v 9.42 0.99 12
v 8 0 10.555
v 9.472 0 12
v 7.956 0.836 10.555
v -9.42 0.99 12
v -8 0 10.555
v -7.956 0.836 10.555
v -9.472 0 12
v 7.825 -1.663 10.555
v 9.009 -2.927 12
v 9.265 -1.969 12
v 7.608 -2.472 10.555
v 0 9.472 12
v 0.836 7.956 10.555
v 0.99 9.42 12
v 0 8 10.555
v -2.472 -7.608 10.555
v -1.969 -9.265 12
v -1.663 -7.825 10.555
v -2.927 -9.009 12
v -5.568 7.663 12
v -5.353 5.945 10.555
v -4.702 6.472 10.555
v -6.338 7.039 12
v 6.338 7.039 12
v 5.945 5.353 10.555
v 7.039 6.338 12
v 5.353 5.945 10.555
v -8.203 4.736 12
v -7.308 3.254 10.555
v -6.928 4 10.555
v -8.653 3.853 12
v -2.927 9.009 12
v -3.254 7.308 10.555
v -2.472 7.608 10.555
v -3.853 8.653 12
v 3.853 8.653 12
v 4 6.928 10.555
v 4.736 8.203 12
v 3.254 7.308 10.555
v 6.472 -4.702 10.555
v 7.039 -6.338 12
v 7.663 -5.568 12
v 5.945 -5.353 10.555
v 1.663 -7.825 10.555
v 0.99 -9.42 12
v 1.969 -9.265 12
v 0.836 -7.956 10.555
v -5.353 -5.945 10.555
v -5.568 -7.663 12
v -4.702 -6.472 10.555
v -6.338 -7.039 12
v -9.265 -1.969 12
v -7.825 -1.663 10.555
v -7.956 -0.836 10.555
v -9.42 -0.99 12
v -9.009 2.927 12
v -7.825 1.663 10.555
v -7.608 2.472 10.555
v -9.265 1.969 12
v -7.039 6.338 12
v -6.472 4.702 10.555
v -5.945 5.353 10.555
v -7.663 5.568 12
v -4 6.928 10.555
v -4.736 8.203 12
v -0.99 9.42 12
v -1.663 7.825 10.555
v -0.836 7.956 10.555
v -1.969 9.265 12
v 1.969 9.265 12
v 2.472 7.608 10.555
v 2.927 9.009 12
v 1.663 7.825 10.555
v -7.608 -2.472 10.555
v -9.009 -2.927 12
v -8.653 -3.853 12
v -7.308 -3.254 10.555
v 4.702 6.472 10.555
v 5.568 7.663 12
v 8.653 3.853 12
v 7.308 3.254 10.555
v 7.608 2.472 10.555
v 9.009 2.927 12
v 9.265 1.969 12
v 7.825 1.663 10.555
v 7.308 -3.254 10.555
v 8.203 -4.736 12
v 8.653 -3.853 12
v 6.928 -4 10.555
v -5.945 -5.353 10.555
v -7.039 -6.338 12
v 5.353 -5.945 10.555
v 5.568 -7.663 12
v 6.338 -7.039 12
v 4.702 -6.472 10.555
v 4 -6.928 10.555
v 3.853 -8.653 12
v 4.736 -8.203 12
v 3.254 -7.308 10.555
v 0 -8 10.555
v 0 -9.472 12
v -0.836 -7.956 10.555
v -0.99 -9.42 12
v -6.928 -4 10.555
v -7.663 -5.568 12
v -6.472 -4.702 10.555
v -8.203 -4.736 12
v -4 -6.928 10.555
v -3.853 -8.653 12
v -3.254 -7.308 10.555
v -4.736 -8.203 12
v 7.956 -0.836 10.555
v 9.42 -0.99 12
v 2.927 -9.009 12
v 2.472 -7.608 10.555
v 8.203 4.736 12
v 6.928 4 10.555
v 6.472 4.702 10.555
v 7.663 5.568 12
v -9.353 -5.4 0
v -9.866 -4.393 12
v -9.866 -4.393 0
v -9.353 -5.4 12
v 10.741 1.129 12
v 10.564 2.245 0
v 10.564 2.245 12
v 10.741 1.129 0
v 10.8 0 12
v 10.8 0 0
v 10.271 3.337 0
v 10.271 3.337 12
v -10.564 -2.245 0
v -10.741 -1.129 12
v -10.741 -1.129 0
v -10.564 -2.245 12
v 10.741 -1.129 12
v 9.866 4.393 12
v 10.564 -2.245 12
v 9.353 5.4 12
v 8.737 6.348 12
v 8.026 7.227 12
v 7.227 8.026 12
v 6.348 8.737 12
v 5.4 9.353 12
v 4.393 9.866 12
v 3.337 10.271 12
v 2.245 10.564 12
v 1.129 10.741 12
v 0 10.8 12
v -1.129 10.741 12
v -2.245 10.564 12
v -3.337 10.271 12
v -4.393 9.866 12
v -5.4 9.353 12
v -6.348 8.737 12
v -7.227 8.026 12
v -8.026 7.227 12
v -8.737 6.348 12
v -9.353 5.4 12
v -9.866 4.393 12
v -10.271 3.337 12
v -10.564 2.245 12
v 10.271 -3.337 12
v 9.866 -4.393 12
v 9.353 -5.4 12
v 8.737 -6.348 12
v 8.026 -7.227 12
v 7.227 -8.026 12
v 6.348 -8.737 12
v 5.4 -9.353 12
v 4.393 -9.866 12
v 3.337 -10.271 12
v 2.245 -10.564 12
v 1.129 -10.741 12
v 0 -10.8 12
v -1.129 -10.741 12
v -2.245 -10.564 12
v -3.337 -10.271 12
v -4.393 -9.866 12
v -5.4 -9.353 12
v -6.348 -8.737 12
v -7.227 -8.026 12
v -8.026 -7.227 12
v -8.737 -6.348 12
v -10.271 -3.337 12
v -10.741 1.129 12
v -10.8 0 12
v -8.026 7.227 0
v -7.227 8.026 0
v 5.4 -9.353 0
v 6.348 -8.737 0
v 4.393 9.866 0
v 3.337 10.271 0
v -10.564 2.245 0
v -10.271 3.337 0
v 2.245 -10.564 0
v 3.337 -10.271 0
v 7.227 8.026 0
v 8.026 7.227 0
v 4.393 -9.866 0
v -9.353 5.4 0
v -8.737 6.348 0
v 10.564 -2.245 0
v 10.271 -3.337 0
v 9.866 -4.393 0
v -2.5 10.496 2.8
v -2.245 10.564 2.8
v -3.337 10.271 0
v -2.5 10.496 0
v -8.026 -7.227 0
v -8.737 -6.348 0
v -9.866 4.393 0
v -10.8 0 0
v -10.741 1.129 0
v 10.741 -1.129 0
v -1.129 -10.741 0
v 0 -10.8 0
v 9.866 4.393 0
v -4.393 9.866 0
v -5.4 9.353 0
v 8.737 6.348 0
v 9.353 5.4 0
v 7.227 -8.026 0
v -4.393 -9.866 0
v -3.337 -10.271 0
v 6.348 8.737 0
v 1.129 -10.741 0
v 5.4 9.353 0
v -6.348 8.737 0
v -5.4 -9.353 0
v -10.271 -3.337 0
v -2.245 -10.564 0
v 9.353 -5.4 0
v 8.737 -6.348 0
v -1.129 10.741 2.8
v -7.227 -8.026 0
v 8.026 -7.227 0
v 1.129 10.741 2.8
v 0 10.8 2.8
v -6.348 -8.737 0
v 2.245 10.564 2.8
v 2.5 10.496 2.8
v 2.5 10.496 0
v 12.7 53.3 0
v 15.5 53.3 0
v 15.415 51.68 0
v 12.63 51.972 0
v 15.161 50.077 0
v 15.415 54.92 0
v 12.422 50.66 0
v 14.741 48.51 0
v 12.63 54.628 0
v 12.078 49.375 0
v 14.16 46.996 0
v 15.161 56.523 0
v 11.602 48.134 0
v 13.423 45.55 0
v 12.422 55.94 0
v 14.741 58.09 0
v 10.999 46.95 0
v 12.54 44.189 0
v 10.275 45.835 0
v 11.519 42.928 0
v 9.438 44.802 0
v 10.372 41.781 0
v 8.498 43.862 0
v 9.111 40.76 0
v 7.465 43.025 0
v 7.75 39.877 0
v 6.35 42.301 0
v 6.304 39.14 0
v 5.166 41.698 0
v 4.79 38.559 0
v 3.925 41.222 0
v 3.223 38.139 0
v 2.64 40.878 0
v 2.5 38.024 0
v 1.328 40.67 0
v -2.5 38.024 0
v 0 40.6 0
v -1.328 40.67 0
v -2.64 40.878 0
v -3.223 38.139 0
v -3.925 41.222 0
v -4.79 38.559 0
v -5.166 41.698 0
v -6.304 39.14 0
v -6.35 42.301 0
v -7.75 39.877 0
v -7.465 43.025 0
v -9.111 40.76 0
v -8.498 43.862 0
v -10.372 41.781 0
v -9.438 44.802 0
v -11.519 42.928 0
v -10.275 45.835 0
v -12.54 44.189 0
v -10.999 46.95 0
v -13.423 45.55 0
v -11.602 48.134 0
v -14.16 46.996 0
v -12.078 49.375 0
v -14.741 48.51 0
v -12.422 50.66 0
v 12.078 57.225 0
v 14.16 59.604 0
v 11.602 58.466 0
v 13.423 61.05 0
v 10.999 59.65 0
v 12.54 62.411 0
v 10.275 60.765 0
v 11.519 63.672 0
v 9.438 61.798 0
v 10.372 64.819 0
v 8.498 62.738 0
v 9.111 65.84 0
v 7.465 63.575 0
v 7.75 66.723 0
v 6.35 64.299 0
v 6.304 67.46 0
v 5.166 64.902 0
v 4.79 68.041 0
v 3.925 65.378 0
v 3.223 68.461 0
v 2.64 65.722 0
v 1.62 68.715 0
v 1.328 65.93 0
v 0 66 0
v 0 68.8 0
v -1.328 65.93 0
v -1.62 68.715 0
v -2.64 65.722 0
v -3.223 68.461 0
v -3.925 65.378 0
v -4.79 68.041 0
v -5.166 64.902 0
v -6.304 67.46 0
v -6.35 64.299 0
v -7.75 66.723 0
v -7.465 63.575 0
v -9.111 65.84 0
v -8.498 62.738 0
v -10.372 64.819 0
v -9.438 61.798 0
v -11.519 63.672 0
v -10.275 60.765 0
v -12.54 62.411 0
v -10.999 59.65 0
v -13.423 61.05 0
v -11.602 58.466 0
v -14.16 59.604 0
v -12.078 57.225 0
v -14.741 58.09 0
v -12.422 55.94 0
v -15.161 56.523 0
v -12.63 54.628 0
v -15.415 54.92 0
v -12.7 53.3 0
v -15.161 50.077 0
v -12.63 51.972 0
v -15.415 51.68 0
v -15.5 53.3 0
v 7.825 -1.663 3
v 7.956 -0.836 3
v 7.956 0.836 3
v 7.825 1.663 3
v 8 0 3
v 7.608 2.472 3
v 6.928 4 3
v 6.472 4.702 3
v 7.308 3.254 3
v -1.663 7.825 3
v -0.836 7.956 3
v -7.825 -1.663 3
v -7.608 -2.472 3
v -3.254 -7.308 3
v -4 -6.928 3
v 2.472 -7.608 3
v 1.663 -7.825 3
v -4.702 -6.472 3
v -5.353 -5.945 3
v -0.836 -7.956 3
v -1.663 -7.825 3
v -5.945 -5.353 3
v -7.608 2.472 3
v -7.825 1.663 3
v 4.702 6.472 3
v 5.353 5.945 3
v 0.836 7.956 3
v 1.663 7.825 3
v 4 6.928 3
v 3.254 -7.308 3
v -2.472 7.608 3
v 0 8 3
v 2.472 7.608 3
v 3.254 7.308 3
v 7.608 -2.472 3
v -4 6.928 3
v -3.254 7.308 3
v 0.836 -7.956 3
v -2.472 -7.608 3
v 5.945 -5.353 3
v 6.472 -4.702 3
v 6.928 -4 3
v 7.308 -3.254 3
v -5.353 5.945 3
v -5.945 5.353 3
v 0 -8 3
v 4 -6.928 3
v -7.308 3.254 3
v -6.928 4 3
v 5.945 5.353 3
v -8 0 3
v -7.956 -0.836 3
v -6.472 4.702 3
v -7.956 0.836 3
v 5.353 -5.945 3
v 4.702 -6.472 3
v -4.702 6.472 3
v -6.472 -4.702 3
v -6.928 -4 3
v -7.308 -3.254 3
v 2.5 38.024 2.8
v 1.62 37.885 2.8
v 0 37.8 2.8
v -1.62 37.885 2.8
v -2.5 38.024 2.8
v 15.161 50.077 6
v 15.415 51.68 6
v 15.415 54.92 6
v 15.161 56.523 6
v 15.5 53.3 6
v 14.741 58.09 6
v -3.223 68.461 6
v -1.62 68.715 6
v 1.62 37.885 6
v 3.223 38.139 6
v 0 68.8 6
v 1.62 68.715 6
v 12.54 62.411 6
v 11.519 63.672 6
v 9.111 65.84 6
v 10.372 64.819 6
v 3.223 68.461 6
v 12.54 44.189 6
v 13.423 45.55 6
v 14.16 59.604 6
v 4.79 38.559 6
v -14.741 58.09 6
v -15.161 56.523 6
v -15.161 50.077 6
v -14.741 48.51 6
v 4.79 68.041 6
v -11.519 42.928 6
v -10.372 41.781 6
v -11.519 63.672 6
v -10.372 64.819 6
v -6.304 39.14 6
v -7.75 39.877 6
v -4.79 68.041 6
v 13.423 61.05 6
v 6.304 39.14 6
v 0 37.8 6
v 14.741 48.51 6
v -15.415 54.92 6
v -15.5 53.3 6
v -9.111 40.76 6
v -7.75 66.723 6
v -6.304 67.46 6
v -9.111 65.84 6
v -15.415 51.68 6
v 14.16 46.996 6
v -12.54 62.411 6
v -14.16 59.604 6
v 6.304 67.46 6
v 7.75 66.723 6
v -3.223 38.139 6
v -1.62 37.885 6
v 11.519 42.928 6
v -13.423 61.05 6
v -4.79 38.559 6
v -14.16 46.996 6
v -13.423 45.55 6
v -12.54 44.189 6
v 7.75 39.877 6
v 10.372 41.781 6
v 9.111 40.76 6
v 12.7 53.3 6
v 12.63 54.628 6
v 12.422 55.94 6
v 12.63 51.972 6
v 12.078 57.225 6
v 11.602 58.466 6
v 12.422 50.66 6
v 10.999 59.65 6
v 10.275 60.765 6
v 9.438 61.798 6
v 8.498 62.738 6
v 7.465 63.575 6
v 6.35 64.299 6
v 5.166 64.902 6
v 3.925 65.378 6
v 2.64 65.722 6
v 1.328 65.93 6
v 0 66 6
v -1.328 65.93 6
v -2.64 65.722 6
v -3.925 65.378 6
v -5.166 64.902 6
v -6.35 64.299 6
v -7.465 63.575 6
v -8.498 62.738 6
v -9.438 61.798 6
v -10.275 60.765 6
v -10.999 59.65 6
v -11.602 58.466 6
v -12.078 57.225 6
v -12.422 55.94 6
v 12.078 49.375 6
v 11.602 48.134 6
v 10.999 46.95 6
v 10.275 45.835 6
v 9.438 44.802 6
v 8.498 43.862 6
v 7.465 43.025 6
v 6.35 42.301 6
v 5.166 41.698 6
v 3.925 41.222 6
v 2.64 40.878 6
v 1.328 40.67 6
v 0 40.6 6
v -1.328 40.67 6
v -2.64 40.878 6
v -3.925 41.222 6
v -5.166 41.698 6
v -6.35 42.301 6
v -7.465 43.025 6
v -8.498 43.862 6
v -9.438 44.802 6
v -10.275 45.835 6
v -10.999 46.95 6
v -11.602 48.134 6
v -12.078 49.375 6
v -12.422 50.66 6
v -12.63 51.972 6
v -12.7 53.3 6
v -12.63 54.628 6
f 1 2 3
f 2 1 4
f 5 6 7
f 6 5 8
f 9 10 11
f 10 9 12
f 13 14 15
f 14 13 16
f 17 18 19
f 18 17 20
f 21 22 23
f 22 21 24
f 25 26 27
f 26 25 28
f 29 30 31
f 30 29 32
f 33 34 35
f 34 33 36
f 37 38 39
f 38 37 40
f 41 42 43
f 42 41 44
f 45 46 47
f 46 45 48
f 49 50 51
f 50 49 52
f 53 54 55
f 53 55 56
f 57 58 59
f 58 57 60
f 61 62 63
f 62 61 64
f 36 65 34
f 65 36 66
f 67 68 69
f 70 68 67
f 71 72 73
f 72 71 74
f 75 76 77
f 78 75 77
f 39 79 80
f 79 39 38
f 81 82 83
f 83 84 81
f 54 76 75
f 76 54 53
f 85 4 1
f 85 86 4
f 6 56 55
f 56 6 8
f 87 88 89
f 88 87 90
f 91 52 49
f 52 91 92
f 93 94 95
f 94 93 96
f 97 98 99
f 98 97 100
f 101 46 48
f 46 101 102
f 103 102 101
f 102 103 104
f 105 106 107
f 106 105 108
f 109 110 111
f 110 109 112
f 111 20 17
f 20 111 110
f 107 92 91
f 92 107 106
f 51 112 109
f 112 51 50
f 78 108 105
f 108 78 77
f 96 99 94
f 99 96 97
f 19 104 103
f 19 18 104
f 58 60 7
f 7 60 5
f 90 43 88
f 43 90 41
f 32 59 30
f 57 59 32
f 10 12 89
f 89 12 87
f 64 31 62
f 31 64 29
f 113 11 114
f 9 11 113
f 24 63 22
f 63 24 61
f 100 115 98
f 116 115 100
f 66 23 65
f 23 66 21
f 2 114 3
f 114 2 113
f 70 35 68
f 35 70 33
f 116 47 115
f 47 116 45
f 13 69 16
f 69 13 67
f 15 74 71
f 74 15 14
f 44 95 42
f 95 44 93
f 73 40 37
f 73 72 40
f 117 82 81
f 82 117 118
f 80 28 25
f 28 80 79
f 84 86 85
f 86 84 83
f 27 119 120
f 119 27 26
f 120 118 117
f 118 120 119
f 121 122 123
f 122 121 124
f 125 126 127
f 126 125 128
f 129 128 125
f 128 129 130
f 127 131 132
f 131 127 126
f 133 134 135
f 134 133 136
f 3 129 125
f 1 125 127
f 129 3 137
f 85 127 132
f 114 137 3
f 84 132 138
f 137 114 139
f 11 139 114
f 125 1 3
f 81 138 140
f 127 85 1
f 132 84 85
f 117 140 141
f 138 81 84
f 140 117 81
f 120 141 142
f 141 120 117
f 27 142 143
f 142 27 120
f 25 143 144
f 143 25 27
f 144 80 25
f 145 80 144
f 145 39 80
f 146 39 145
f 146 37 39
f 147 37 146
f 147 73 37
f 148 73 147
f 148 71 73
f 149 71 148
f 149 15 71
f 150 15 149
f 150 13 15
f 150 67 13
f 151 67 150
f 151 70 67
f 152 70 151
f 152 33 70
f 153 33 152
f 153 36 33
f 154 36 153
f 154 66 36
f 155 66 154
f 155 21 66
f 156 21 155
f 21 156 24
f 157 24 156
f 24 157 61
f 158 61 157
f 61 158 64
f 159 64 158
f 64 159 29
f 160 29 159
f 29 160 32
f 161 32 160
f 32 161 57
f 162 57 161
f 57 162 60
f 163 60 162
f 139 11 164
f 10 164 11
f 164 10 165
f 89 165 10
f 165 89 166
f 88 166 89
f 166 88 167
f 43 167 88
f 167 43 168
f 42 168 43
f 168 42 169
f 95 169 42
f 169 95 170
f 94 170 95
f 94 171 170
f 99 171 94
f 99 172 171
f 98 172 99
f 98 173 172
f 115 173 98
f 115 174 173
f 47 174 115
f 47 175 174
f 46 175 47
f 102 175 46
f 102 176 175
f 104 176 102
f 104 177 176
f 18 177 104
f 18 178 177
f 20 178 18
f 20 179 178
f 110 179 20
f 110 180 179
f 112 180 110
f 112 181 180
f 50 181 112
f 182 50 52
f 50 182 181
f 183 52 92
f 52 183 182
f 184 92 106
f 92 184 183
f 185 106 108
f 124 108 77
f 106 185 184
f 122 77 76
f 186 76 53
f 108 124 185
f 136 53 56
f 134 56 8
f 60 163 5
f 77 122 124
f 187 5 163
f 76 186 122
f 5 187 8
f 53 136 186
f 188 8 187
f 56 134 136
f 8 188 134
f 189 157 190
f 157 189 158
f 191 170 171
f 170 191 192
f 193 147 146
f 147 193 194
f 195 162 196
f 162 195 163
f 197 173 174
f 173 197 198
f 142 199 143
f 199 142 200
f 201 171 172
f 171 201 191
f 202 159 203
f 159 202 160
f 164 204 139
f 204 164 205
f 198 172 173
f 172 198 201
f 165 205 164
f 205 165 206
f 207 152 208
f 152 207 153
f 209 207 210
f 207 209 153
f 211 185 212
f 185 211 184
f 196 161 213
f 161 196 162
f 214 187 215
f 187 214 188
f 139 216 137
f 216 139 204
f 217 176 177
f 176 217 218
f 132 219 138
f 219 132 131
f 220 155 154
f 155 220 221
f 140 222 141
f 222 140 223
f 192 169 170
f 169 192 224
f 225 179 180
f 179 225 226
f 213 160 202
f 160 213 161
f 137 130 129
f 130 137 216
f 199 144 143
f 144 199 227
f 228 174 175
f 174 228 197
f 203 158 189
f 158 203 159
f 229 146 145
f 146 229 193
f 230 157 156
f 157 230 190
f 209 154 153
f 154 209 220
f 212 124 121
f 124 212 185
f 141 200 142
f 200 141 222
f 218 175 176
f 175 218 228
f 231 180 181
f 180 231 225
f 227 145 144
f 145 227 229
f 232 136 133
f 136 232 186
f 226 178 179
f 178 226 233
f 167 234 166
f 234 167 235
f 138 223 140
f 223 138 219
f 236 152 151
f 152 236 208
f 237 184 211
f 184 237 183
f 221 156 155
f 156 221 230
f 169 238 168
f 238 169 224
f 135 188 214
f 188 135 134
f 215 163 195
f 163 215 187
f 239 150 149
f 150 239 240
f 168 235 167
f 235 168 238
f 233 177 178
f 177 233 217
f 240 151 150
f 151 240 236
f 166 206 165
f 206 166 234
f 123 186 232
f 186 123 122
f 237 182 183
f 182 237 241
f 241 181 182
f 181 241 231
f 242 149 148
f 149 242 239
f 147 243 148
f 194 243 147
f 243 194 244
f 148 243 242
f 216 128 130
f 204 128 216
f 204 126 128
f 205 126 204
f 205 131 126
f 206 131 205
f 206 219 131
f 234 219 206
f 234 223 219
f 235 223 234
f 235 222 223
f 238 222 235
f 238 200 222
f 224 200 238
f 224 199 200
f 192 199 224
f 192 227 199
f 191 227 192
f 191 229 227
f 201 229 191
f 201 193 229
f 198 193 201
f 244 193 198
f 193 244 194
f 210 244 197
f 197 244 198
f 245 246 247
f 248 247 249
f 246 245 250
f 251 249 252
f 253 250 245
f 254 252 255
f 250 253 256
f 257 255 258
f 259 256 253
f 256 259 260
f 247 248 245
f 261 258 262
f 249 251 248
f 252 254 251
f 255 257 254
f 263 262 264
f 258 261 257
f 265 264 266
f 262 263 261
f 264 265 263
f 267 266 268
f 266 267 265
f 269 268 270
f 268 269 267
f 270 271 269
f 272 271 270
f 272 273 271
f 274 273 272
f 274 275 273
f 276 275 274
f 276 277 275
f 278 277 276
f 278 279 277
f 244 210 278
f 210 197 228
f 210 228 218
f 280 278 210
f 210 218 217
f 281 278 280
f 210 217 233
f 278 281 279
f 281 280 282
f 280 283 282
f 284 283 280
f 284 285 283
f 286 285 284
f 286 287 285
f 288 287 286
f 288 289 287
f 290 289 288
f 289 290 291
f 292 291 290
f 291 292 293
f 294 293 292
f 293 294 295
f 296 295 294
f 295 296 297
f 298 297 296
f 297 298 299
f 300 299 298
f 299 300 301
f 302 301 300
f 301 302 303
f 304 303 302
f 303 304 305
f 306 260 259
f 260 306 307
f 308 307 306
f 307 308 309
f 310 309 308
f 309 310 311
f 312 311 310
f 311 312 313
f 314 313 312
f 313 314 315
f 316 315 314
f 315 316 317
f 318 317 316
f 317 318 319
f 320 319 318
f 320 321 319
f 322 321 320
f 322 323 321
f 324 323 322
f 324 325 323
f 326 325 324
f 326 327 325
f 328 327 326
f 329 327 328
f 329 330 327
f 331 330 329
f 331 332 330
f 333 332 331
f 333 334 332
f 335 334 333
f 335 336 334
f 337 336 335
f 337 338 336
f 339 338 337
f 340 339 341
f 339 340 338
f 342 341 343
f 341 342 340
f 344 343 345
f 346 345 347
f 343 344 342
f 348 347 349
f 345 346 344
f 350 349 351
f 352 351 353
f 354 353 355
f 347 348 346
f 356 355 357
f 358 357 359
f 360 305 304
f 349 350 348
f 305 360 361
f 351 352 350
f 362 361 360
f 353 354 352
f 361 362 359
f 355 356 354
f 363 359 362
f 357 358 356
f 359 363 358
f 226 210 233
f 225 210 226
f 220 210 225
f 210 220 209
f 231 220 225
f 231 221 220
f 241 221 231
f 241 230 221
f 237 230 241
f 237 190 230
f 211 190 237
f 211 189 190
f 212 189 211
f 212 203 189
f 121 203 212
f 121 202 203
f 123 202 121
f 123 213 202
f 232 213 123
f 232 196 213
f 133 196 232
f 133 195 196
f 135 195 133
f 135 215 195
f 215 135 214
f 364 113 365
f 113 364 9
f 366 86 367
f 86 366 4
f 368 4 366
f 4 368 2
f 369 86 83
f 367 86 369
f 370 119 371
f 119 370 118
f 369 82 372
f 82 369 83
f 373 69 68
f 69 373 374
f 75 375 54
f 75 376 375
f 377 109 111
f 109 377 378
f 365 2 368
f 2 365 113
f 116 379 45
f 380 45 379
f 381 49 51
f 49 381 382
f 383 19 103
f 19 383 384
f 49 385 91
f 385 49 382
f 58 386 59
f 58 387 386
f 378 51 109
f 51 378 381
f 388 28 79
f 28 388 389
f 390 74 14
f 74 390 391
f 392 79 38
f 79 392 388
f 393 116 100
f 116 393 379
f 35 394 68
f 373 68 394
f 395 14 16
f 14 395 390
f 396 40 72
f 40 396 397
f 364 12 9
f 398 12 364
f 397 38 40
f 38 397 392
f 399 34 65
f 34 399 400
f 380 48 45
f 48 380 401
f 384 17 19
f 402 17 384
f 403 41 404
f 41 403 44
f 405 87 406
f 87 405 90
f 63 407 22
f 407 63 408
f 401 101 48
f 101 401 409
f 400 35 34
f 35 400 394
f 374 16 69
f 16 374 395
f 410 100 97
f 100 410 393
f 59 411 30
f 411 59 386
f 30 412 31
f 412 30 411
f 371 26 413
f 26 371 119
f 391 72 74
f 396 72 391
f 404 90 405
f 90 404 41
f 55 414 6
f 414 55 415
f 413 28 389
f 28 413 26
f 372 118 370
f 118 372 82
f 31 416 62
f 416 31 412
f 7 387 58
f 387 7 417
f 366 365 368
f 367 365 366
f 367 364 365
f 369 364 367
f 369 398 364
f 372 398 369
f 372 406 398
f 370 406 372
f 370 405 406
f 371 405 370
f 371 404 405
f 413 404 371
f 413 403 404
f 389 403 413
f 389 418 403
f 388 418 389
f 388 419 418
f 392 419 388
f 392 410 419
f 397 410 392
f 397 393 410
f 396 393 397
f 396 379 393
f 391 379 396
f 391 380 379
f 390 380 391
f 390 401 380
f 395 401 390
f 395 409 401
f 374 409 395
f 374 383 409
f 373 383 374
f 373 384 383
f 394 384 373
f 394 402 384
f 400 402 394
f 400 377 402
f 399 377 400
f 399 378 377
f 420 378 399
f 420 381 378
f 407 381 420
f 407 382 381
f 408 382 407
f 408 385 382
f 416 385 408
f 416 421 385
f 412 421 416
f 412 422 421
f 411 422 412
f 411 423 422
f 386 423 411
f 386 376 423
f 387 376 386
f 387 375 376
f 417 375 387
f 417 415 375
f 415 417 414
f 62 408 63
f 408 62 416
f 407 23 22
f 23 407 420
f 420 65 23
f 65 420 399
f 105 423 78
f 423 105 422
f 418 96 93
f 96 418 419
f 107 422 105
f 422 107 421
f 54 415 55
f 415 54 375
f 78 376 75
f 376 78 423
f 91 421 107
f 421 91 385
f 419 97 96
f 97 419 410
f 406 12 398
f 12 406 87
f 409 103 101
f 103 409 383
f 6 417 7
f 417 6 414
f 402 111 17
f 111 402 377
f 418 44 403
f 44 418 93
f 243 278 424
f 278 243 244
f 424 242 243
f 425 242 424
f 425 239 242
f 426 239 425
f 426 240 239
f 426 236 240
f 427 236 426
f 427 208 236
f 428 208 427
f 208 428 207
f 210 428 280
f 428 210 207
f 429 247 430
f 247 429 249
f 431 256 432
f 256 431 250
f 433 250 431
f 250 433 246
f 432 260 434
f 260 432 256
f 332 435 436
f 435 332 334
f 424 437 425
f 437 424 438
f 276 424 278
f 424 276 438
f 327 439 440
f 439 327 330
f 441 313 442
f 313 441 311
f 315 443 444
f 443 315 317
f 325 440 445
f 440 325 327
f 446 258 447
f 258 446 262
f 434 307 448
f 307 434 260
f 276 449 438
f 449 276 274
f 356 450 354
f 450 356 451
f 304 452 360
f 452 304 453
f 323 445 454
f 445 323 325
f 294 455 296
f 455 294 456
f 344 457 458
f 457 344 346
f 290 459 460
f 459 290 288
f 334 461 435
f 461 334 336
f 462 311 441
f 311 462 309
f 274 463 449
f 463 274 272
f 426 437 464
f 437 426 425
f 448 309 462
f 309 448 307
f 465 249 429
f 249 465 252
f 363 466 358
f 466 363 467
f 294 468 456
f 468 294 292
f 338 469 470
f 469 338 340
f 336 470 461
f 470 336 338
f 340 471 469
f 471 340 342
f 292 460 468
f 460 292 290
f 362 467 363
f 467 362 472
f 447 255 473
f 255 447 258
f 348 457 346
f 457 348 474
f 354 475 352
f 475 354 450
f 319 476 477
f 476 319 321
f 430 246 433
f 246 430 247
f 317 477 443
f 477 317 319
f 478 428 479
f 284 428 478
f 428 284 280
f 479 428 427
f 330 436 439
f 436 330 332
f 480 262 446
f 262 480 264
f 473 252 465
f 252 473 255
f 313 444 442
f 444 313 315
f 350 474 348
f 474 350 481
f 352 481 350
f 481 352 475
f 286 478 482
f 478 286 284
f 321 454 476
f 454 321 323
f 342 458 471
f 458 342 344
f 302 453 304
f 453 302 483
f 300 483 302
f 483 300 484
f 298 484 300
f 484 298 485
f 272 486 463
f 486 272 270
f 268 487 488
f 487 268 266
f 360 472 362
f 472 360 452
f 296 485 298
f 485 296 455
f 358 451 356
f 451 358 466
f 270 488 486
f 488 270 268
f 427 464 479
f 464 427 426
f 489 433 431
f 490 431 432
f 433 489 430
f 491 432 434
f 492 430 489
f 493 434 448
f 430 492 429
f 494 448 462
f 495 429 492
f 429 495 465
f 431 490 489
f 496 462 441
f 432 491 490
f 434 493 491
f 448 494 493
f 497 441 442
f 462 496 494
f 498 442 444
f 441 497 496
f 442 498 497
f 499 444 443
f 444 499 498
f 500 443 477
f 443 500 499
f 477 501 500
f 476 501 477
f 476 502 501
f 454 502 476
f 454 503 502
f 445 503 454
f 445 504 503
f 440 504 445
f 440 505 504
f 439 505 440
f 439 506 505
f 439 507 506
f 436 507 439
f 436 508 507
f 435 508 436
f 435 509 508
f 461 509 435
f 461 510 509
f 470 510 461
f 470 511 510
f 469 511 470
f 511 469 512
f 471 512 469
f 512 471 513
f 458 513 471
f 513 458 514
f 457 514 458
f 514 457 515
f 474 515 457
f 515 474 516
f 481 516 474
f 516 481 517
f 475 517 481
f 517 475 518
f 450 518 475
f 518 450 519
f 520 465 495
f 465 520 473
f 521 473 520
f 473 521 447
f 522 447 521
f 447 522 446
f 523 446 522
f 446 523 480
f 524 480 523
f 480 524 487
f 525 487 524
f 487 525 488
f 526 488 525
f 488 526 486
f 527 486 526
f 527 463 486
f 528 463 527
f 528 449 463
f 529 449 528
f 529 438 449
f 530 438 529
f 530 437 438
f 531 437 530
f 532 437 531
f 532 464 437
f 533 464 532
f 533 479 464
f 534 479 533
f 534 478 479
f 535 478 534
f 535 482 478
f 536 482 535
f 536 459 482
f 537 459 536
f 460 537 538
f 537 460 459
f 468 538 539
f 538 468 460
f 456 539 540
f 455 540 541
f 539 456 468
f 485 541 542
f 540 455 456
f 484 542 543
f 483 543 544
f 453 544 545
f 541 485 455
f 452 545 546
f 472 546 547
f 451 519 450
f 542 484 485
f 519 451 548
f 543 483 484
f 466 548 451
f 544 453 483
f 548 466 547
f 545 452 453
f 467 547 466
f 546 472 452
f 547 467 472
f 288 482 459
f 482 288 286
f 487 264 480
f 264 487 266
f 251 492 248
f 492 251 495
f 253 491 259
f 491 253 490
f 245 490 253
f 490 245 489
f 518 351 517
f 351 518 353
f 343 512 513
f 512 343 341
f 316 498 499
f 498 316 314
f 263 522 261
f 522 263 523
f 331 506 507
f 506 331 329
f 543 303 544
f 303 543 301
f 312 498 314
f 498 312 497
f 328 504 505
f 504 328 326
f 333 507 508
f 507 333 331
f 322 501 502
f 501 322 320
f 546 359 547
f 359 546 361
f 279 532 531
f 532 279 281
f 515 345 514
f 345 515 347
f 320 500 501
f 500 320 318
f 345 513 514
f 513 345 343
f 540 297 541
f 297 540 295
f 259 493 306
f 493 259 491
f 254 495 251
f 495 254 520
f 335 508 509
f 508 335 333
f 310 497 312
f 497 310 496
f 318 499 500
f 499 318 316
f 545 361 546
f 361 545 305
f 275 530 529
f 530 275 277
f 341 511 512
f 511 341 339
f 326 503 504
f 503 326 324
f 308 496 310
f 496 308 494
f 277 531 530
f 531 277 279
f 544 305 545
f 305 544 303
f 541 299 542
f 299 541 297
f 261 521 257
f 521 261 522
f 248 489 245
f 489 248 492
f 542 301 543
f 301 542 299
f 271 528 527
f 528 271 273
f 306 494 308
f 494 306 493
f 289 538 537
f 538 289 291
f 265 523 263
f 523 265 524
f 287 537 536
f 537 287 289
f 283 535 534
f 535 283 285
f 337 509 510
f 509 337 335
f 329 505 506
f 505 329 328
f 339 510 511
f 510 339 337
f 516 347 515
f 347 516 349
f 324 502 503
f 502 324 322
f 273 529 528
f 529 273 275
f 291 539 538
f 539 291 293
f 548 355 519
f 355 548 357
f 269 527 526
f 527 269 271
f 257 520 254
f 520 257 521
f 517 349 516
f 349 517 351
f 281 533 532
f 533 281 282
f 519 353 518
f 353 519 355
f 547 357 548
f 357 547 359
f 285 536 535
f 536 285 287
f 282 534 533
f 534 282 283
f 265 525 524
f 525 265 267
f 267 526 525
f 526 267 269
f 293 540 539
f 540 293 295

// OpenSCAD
/*[Test tube cap generator]*/
// By MagoNegro OCT-2017

// Tube outer diameter:
TubeOuterDiameter=15.6;
// Cap height:
CapHeight=12;
// Cap thickness:
CapThickness=3;
// Facets:
Facets=60; // [4:100]
// Tolerance (Typ. 0.2mm)
Tolerance = 0.2;
// Guard's lenght (Choose yours...):
GuardLength = 30.0;
// Guard's width (Choose yours...):
GuardWidth = 5.0;
// Guard's inner diameter (Typ. same of tube's):
GuardInnerDiameter = 25.0;
// Make guard or not (0..1)
UseGuard=1;

/* [Hidden] */
CapIntR=(TubeOuterDiameter/2)+Tolerance;
CapOutR=CapIntR+CapThickness-Tolerance;

GuardIntR=(GuardInnerDiameter/2)+Tolerance;
GuardOutR=GuardIntR+CapThickness-Tolerance;

module MakeCap()
{
    difference()
    {
        cylinder(h = CapHeight, 
            r = CapOutR, 
            center = false,
            $fn=Facets);
        // Hole
        translate([0,0,CapThickness])
            cylinder(h = CapHeight, 
                r = CapIntR, 
                center = false,
                $fn=Facets);
        translate([0,0,CapHeight-CapOutR+CapThickness/2])
            difference()
            {
            cylinder(h=CapOutR,
                r1=0,
                r2=CapOutR+Tolerance,
                $fn=Facets);
            translate([0,0,-CapThickness])
                cylinder(h=CapOutR,
                    r=CapOutR+Tolerance*2,
                    $fn=Facets);
            }
    }
}

module MakeGuard()
{
    GR=CapOutR+GuardLength;
    difference()
    {
        union()
        {
            translate([-GuardWidth/2,0,0])
                cube([GuardWidth,GR,CapThickness-Tolerance]);
            translate([0,GR+GuardOutR-CapThickness,0])
                    cylinder(h=CapThickness*2,
                        r=GuardOutR,
                        $fn=Facets);
        }
        translate([0,GR+GuardOutR-CapThickness,-CapThickness/2])
                cylinder(h=CapThickness*3,
                    r=GuardIntR,
                    $fn=Facets);
    }
}


// Main
union()
    {
    MakeCap();
    if (UseGuard!=0) MakeGuard();
    }
